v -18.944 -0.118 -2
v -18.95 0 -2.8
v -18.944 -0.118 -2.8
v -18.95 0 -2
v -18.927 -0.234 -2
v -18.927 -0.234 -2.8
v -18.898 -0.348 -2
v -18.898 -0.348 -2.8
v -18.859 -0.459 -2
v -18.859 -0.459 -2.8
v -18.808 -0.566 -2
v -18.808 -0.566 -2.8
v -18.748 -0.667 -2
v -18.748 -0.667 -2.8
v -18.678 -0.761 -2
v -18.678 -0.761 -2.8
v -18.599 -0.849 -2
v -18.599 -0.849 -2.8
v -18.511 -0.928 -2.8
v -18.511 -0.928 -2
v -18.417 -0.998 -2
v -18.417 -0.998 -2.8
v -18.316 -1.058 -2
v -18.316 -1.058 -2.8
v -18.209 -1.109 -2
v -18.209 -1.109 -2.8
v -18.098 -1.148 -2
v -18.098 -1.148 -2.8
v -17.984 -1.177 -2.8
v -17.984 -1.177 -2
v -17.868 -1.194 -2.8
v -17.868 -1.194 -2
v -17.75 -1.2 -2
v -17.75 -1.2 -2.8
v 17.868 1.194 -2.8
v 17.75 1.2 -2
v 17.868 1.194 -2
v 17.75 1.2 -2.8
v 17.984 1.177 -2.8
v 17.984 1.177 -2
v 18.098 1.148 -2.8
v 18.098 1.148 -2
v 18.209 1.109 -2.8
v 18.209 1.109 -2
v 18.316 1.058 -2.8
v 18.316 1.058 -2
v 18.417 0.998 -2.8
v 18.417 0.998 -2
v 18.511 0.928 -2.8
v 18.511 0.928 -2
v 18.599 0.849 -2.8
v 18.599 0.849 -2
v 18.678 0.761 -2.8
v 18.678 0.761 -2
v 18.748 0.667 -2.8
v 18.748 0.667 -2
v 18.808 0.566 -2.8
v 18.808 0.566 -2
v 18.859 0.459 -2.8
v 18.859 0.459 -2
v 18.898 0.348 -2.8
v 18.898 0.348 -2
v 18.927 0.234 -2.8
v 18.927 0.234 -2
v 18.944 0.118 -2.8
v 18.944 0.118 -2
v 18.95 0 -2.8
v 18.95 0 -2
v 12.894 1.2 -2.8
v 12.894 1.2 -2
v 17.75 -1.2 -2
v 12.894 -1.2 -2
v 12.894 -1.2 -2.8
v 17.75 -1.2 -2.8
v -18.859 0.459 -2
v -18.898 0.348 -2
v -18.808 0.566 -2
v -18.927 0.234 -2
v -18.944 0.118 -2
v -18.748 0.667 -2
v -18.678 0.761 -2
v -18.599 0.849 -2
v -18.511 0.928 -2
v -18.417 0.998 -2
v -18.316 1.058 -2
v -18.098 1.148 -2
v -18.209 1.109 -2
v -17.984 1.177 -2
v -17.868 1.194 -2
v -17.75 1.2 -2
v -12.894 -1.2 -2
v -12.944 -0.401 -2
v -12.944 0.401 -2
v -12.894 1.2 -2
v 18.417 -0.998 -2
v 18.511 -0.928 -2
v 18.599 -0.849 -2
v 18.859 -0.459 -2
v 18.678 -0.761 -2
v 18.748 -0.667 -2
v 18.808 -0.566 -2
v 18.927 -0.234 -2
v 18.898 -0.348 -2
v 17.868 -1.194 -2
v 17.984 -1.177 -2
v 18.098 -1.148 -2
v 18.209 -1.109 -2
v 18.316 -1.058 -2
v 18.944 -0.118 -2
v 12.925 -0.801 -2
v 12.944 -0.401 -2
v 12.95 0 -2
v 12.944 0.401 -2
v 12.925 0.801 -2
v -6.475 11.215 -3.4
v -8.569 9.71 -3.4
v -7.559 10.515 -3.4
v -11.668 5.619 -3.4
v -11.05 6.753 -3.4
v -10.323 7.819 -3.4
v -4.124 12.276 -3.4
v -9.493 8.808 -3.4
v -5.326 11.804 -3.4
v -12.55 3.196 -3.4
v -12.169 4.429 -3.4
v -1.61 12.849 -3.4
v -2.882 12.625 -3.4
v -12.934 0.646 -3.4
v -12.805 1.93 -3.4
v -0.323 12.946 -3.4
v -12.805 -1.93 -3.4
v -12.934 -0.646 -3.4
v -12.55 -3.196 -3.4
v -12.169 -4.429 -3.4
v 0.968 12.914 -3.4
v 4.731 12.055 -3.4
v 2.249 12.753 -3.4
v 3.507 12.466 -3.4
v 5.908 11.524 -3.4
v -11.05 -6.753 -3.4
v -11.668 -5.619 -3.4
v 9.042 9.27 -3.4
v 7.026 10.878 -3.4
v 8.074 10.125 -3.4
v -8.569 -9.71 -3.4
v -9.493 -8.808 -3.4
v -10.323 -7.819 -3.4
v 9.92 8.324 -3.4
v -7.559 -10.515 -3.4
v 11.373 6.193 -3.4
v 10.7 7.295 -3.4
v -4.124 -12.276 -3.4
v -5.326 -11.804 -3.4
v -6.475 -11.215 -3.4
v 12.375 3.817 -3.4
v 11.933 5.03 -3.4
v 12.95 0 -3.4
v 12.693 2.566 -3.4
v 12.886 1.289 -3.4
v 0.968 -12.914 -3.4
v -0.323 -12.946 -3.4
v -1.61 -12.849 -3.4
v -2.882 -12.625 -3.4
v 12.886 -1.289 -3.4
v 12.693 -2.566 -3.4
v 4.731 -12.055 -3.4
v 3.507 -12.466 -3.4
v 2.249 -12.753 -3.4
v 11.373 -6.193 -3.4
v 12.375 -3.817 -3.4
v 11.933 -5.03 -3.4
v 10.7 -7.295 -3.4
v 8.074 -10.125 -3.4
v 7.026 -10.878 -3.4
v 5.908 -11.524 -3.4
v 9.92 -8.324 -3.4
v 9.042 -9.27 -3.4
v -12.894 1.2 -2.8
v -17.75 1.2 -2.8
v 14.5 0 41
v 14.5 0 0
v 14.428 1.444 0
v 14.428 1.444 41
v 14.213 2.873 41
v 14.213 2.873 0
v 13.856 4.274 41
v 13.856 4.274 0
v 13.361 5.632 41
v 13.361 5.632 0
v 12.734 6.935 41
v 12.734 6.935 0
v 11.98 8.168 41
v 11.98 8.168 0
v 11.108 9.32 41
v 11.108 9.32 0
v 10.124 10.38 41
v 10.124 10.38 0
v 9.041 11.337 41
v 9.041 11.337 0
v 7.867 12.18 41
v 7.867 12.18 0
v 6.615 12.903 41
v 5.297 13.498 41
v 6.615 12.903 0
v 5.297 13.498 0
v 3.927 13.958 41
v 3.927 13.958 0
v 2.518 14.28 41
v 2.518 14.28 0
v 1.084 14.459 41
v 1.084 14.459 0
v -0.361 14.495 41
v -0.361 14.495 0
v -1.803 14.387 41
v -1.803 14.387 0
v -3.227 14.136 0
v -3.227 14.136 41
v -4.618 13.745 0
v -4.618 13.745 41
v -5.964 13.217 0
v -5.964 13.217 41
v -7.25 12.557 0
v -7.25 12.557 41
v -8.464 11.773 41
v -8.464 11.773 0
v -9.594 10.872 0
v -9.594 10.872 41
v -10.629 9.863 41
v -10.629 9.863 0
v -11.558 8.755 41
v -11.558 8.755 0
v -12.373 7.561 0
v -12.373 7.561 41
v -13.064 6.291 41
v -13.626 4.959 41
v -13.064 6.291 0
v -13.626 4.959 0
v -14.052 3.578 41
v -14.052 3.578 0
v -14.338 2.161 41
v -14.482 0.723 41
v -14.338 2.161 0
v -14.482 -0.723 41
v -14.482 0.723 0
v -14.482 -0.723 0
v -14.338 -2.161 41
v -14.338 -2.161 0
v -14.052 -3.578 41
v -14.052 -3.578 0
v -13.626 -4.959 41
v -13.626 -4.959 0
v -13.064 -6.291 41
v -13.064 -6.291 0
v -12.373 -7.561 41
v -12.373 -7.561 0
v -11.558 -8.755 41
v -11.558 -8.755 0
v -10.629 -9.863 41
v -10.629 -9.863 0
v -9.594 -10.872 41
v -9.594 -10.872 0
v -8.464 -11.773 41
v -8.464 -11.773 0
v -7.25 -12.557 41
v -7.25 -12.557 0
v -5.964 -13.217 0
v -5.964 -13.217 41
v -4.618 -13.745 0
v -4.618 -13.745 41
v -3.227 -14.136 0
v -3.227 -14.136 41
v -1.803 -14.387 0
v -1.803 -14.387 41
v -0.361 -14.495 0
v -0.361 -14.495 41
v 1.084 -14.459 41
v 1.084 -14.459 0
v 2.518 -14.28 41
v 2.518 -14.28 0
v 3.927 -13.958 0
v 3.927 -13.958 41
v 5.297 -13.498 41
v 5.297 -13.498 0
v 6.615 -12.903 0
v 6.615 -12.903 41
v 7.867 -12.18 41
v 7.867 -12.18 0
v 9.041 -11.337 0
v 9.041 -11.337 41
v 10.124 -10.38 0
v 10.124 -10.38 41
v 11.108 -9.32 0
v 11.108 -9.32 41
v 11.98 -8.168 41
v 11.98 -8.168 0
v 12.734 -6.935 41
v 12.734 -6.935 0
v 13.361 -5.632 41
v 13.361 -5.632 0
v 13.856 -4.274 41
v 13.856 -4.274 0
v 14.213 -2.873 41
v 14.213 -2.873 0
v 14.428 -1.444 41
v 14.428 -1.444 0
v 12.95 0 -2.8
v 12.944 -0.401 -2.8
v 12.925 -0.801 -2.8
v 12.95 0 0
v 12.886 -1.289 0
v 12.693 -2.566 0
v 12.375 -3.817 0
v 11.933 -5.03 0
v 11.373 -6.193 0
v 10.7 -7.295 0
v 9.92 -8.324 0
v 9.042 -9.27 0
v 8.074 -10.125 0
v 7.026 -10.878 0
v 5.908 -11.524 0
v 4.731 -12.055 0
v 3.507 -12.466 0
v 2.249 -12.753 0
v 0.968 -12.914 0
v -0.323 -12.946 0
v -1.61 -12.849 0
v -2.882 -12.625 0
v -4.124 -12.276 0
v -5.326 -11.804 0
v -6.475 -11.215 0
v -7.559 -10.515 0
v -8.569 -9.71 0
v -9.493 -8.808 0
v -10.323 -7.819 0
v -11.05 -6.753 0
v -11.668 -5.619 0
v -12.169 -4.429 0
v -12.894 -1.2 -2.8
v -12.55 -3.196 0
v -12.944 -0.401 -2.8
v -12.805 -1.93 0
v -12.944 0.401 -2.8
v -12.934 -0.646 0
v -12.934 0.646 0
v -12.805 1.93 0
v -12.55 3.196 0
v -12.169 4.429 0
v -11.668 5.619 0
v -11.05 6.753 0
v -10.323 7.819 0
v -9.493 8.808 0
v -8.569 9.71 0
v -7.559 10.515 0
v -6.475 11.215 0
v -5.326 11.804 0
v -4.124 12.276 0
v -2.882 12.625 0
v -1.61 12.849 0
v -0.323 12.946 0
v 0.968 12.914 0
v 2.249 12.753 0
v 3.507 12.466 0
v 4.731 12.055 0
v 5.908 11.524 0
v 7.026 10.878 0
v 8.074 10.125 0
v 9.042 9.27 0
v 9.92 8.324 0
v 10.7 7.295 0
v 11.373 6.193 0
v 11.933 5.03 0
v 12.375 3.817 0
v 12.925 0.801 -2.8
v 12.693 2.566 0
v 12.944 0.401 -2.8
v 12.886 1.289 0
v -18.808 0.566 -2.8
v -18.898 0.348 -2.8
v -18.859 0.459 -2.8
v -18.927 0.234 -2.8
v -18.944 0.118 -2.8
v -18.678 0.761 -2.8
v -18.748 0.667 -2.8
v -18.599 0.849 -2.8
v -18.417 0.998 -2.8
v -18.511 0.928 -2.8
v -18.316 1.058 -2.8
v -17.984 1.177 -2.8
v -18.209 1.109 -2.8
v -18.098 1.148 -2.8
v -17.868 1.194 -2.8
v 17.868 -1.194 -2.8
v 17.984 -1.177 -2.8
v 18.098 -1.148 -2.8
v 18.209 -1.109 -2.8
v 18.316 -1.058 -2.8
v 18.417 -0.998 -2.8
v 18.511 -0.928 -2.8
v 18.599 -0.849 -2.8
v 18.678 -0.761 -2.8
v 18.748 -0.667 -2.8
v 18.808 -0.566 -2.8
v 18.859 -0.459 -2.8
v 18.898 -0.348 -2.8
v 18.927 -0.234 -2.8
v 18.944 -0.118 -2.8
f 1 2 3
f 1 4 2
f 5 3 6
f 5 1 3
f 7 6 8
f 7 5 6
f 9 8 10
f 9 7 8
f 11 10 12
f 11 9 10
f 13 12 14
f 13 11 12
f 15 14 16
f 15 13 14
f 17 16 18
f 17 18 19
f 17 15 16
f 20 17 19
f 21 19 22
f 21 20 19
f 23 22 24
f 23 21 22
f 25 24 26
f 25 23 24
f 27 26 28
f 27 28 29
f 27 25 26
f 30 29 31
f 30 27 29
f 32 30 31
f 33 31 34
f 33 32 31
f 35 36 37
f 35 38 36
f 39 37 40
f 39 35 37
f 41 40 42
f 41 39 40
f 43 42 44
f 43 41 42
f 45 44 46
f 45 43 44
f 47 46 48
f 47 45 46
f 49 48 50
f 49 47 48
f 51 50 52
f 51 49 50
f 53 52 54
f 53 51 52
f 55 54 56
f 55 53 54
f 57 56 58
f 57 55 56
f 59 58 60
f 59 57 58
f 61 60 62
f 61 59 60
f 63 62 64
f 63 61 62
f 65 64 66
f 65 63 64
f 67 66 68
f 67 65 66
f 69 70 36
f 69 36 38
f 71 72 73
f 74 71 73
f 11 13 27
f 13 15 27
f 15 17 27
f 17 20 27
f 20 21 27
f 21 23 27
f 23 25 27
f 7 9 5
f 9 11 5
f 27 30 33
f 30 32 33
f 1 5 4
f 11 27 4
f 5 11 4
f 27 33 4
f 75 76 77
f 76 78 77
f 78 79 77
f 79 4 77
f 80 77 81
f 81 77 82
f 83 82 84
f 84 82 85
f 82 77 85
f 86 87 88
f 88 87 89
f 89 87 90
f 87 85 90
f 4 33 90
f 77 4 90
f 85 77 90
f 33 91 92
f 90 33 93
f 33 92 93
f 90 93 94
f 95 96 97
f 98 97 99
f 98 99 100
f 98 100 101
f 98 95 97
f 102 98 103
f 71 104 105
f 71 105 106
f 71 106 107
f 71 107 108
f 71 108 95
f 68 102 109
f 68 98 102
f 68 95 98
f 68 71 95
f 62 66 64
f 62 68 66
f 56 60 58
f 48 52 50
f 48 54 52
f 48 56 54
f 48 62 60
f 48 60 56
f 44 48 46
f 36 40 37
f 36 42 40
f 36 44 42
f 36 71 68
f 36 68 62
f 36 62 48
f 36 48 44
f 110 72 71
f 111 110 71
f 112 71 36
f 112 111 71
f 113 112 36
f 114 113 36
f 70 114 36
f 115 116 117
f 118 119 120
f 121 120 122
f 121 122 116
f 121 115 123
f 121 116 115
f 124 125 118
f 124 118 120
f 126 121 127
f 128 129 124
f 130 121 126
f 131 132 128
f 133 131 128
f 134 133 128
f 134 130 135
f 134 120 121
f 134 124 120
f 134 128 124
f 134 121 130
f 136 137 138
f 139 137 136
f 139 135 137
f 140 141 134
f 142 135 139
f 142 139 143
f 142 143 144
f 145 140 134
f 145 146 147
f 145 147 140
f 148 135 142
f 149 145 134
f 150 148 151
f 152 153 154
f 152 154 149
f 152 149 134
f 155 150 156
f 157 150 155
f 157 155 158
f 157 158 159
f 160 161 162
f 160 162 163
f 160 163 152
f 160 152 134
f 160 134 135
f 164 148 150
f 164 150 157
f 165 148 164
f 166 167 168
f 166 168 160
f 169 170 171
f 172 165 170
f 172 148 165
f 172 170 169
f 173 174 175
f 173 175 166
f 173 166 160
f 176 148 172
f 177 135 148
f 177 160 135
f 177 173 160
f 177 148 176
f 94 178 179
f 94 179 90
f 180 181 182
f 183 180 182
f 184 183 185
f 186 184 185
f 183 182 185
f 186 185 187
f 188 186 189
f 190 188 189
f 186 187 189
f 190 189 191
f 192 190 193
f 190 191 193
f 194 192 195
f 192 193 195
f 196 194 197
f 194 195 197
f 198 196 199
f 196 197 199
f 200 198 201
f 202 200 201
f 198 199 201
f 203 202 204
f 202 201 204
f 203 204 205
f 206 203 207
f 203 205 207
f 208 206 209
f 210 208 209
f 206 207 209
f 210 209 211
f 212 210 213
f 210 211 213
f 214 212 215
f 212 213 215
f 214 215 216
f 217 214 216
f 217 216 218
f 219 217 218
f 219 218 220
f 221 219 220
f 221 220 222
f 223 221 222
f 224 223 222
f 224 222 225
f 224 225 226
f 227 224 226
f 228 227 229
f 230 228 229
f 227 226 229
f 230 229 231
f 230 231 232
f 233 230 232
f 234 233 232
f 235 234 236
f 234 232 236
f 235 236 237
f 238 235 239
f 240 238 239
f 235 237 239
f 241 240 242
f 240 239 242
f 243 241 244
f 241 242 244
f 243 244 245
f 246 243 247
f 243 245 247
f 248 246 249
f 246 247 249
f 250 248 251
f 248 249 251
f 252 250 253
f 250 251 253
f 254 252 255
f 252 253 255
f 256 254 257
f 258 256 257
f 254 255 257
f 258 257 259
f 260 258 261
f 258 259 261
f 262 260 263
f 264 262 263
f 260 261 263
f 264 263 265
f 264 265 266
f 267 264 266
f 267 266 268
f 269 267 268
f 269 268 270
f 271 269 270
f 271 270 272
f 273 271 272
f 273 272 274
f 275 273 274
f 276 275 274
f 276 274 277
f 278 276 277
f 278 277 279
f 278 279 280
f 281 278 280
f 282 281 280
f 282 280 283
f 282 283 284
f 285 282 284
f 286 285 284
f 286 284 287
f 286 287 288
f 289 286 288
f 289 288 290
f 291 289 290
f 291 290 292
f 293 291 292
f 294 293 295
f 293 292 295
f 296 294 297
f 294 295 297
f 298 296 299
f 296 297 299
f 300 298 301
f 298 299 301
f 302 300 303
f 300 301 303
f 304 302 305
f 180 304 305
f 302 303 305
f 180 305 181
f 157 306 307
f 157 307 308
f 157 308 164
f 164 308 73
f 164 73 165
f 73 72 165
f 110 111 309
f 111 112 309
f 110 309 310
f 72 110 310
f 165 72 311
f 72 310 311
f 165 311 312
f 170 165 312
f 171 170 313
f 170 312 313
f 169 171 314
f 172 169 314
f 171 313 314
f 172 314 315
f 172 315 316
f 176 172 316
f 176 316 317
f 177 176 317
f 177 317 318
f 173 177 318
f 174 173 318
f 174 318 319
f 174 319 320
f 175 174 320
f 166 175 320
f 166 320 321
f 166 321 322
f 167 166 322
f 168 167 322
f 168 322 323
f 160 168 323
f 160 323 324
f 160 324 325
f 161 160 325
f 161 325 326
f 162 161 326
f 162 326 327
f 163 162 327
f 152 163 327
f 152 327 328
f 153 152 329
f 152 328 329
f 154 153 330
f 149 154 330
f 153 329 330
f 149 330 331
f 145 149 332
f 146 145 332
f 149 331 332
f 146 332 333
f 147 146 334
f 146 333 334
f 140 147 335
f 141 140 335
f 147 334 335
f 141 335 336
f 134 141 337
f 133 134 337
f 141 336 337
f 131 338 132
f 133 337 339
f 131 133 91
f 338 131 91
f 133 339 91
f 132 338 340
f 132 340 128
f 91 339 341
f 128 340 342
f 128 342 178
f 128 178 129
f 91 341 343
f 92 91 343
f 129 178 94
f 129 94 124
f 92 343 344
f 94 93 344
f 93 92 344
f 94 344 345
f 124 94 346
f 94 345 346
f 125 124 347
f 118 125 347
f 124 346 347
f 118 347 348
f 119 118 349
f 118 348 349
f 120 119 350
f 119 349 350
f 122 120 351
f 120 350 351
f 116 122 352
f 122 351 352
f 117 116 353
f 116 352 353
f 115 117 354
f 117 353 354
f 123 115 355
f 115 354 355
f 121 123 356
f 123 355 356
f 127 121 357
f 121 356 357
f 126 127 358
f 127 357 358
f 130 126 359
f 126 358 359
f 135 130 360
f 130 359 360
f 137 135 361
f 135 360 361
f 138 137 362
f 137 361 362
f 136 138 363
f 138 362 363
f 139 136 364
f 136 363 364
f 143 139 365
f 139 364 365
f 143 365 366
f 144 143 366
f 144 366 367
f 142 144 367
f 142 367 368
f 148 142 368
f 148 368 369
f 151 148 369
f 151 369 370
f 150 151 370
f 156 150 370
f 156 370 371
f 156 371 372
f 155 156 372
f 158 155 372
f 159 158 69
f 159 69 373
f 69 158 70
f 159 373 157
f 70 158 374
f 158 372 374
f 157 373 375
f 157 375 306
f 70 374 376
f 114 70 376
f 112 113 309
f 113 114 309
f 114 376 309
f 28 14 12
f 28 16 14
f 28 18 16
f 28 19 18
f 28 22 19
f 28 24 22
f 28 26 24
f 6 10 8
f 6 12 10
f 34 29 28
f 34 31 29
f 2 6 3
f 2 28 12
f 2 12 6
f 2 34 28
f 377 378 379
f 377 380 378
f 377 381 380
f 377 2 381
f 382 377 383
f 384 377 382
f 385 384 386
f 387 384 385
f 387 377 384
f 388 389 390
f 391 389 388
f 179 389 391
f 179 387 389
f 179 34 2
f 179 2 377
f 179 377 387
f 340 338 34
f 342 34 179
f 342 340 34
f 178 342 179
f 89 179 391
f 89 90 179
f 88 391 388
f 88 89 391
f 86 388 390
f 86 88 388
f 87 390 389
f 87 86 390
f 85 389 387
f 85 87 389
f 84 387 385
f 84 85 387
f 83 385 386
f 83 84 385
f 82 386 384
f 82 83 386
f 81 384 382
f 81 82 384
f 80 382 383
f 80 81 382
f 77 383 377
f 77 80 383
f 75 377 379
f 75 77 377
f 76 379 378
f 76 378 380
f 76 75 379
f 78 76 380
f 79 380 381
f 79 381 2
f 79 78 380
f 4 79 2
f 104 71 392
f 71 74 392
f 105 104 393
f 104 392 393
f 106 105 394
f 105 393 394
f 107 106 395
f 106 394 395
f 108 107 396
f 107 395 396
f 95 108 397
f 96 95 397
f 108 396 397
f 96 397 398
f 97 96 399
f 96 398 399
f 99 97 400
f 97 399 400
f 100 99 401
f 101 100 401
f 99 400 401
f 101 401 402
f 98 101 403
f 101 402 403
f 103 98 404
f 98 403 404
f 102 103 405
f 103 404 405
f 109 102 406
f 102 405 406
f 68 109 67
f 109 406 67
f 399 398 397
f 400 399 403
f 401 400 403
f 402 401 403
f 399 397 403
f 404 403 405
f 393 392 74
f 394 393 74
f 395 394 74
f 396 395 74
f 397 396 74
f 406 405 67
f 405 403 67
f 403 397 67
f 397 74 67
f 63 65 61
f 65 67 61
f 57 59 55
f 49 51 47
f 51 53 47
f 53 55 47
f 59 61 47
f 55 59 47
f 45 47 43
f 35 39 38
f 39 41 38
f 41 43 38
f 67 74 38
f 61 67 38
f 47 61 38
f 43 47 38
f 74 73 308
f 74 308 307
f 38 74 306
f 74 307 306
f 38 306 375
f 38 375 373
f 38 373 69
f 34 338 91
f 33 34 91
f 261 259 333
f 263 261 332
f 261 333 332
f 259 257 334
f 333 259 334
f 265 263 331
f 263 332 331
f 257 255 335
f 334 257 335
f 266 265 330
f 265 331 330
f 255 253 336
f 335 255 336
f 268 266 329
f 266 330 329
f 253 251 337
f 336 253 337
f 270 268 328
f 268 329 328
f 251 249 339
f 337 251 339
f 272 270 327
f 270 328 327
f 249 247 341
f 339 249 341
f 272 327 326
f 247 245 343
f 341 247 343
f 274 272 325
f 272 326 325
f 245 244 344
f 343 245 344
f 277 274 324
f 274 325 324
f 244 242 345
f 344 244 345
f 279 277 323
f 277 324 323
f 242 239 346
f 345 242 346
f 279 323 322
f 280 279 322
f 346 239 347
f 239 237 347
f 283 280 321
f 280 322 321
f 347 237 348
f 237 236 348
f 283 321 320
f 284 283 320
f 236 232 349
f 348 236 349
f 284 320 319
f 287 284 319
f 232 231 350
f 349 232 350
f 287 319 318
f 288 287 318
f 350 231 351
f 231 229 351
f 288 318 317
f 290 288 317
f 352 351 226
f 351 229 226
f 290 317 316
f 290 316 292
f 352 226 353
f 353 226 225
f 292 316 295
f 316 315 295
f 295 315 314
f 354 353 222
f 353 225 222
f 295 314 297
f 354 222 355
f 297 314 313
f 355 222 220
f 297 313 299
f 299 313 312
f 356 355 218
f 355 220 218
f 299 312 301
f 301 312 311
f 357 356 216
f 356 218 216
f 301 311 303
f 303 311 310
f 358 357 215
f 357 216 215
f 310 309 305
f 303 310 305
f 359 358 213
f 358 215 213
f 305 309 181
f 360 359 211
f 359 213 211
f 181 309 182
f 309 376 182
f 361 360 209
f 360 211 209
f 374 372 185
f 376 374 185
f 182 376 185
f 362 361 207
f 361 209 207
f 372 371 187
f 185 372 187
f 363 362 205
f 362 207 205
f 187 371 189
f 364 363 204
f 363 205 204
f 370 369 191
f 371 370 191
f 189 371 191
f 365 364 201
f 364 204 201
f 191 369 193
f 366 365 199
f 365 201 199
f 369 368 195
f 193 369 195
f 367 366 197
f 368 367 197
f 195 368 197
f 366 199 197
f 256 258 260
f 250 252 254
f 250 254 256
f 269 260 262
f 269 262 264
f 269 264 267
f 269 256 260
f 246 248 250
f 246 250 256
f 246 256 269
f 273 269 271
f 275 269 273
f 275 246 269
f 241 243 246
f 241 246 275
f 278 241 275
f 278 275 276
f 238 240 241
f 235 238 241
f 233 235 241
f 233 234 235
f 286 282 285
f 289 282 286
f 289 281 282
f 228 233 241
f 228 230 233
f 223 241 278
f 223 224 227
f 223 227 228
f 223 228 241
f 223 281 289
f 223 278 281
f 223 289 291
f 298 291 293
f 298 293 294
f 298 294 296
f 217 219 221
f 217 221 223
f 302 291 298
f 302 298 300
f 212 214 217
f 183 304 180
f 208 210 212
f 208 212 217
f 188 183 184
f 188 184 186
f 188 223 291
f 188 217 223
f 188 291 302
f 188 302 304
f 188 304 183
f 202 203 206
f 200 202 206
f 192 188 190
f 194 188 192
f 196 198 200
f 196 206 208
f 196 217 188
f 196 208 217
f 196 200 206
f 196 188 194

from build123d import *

# Parameters (mm, degrees)
ESQUISSE1_R             = 14.5
BOSS_EXTRU_1_DEPTH      = 41
ESQUISSE2_R             = 12.95
BOSS_EXTRU_2_DEPTH      = 3.4
BOSS_EXTRU_3_DEPTH      = 6
BOSS_EXTRU_3_DEPTH_BACK = 1
ESQUISSE3_W             = 0.8
ESQUISSE3_H             = 2.4
BOSS_EXTRU_4_DEPTH      = 6
BOSS_EXTRU_4_DEPTH_BACK = 1
ESQUISSE4_W             = 0.8
ESQUISSE4_H             = 2.4
CONG_1_R                = 1.2


with BuildPart() as part:
    # Esquisse1 → Boss.-Extru.1 (new body)
    with BuildSketch(Plane.XY):
        Circle(ESQUISSE1_R)
    extrude(amount=BOSS_EXTRU_1_DEPTH)

    # Esquisse2 → Boss.-Extru.2 (add)
    with BuildSketch(Plane(origin=(0, 0, 0), x_dir=(-1, 0, 0), z_dir=(0, 0, -1))):
        with Locations(Location((0, 0, 0), (0, 0, 180))):
            Circle(ESQUISSE2_R)
    extrude(amount=BOSS_EXTRU_2_DEPTH)

    # Esquisse3 → Boss.-Extru.3 (add, two sides: drawn at the far end of the back side and taken through both)
    with BuildSketch(Plane(origin=(12.95, 0, 0), x_dir=(0, 0, -1), z_dir=(1, 0, 0)).offset(-BOSS_EXTRU_3_DEPTH_BACK)):
        with Locations((2.4, 0)):
            Rectangle(ESQUISSE3_W, ESQUISSE3_H)
    extrude(amount=BOSS_EXTRU_3_DEPTH + BOSS_EXTRU_3_DEPTH_BACK)

    # Esquisse4 → Boss.-Extru.4 (add, two sides: drawn at the far end of the back side and taken through both)
    with BuildSketch(Plane.ZY.offset(12.95).offset(-BOSS_EXTRU_4_DEPTH_BACK)):
        with Locations((-2.4, 0)):
            Rectangle(ESQUISSE4_W, ESQUISSE4_H)
    extrude(amount=BOSS_EXTRU_4_DEPTH + BOSS_EXTRU_4_DEPTH_BACK)

    # Congé1
    cong_1_edges = [part.edges().sort_by_distance(p)[0] for p in [
        (18.95, -1.2, -2.4),
        (18.95, 1.2, -2.4),
        (-18.95, -1.2, -2.4),
        (-18.95, 1.2, -2.4),
    ]]
    fillet(cong_1_edges, radius=CONG_1_R - 0.0001)  # a hair under: the kernel refuses the full size


solid = part.part
